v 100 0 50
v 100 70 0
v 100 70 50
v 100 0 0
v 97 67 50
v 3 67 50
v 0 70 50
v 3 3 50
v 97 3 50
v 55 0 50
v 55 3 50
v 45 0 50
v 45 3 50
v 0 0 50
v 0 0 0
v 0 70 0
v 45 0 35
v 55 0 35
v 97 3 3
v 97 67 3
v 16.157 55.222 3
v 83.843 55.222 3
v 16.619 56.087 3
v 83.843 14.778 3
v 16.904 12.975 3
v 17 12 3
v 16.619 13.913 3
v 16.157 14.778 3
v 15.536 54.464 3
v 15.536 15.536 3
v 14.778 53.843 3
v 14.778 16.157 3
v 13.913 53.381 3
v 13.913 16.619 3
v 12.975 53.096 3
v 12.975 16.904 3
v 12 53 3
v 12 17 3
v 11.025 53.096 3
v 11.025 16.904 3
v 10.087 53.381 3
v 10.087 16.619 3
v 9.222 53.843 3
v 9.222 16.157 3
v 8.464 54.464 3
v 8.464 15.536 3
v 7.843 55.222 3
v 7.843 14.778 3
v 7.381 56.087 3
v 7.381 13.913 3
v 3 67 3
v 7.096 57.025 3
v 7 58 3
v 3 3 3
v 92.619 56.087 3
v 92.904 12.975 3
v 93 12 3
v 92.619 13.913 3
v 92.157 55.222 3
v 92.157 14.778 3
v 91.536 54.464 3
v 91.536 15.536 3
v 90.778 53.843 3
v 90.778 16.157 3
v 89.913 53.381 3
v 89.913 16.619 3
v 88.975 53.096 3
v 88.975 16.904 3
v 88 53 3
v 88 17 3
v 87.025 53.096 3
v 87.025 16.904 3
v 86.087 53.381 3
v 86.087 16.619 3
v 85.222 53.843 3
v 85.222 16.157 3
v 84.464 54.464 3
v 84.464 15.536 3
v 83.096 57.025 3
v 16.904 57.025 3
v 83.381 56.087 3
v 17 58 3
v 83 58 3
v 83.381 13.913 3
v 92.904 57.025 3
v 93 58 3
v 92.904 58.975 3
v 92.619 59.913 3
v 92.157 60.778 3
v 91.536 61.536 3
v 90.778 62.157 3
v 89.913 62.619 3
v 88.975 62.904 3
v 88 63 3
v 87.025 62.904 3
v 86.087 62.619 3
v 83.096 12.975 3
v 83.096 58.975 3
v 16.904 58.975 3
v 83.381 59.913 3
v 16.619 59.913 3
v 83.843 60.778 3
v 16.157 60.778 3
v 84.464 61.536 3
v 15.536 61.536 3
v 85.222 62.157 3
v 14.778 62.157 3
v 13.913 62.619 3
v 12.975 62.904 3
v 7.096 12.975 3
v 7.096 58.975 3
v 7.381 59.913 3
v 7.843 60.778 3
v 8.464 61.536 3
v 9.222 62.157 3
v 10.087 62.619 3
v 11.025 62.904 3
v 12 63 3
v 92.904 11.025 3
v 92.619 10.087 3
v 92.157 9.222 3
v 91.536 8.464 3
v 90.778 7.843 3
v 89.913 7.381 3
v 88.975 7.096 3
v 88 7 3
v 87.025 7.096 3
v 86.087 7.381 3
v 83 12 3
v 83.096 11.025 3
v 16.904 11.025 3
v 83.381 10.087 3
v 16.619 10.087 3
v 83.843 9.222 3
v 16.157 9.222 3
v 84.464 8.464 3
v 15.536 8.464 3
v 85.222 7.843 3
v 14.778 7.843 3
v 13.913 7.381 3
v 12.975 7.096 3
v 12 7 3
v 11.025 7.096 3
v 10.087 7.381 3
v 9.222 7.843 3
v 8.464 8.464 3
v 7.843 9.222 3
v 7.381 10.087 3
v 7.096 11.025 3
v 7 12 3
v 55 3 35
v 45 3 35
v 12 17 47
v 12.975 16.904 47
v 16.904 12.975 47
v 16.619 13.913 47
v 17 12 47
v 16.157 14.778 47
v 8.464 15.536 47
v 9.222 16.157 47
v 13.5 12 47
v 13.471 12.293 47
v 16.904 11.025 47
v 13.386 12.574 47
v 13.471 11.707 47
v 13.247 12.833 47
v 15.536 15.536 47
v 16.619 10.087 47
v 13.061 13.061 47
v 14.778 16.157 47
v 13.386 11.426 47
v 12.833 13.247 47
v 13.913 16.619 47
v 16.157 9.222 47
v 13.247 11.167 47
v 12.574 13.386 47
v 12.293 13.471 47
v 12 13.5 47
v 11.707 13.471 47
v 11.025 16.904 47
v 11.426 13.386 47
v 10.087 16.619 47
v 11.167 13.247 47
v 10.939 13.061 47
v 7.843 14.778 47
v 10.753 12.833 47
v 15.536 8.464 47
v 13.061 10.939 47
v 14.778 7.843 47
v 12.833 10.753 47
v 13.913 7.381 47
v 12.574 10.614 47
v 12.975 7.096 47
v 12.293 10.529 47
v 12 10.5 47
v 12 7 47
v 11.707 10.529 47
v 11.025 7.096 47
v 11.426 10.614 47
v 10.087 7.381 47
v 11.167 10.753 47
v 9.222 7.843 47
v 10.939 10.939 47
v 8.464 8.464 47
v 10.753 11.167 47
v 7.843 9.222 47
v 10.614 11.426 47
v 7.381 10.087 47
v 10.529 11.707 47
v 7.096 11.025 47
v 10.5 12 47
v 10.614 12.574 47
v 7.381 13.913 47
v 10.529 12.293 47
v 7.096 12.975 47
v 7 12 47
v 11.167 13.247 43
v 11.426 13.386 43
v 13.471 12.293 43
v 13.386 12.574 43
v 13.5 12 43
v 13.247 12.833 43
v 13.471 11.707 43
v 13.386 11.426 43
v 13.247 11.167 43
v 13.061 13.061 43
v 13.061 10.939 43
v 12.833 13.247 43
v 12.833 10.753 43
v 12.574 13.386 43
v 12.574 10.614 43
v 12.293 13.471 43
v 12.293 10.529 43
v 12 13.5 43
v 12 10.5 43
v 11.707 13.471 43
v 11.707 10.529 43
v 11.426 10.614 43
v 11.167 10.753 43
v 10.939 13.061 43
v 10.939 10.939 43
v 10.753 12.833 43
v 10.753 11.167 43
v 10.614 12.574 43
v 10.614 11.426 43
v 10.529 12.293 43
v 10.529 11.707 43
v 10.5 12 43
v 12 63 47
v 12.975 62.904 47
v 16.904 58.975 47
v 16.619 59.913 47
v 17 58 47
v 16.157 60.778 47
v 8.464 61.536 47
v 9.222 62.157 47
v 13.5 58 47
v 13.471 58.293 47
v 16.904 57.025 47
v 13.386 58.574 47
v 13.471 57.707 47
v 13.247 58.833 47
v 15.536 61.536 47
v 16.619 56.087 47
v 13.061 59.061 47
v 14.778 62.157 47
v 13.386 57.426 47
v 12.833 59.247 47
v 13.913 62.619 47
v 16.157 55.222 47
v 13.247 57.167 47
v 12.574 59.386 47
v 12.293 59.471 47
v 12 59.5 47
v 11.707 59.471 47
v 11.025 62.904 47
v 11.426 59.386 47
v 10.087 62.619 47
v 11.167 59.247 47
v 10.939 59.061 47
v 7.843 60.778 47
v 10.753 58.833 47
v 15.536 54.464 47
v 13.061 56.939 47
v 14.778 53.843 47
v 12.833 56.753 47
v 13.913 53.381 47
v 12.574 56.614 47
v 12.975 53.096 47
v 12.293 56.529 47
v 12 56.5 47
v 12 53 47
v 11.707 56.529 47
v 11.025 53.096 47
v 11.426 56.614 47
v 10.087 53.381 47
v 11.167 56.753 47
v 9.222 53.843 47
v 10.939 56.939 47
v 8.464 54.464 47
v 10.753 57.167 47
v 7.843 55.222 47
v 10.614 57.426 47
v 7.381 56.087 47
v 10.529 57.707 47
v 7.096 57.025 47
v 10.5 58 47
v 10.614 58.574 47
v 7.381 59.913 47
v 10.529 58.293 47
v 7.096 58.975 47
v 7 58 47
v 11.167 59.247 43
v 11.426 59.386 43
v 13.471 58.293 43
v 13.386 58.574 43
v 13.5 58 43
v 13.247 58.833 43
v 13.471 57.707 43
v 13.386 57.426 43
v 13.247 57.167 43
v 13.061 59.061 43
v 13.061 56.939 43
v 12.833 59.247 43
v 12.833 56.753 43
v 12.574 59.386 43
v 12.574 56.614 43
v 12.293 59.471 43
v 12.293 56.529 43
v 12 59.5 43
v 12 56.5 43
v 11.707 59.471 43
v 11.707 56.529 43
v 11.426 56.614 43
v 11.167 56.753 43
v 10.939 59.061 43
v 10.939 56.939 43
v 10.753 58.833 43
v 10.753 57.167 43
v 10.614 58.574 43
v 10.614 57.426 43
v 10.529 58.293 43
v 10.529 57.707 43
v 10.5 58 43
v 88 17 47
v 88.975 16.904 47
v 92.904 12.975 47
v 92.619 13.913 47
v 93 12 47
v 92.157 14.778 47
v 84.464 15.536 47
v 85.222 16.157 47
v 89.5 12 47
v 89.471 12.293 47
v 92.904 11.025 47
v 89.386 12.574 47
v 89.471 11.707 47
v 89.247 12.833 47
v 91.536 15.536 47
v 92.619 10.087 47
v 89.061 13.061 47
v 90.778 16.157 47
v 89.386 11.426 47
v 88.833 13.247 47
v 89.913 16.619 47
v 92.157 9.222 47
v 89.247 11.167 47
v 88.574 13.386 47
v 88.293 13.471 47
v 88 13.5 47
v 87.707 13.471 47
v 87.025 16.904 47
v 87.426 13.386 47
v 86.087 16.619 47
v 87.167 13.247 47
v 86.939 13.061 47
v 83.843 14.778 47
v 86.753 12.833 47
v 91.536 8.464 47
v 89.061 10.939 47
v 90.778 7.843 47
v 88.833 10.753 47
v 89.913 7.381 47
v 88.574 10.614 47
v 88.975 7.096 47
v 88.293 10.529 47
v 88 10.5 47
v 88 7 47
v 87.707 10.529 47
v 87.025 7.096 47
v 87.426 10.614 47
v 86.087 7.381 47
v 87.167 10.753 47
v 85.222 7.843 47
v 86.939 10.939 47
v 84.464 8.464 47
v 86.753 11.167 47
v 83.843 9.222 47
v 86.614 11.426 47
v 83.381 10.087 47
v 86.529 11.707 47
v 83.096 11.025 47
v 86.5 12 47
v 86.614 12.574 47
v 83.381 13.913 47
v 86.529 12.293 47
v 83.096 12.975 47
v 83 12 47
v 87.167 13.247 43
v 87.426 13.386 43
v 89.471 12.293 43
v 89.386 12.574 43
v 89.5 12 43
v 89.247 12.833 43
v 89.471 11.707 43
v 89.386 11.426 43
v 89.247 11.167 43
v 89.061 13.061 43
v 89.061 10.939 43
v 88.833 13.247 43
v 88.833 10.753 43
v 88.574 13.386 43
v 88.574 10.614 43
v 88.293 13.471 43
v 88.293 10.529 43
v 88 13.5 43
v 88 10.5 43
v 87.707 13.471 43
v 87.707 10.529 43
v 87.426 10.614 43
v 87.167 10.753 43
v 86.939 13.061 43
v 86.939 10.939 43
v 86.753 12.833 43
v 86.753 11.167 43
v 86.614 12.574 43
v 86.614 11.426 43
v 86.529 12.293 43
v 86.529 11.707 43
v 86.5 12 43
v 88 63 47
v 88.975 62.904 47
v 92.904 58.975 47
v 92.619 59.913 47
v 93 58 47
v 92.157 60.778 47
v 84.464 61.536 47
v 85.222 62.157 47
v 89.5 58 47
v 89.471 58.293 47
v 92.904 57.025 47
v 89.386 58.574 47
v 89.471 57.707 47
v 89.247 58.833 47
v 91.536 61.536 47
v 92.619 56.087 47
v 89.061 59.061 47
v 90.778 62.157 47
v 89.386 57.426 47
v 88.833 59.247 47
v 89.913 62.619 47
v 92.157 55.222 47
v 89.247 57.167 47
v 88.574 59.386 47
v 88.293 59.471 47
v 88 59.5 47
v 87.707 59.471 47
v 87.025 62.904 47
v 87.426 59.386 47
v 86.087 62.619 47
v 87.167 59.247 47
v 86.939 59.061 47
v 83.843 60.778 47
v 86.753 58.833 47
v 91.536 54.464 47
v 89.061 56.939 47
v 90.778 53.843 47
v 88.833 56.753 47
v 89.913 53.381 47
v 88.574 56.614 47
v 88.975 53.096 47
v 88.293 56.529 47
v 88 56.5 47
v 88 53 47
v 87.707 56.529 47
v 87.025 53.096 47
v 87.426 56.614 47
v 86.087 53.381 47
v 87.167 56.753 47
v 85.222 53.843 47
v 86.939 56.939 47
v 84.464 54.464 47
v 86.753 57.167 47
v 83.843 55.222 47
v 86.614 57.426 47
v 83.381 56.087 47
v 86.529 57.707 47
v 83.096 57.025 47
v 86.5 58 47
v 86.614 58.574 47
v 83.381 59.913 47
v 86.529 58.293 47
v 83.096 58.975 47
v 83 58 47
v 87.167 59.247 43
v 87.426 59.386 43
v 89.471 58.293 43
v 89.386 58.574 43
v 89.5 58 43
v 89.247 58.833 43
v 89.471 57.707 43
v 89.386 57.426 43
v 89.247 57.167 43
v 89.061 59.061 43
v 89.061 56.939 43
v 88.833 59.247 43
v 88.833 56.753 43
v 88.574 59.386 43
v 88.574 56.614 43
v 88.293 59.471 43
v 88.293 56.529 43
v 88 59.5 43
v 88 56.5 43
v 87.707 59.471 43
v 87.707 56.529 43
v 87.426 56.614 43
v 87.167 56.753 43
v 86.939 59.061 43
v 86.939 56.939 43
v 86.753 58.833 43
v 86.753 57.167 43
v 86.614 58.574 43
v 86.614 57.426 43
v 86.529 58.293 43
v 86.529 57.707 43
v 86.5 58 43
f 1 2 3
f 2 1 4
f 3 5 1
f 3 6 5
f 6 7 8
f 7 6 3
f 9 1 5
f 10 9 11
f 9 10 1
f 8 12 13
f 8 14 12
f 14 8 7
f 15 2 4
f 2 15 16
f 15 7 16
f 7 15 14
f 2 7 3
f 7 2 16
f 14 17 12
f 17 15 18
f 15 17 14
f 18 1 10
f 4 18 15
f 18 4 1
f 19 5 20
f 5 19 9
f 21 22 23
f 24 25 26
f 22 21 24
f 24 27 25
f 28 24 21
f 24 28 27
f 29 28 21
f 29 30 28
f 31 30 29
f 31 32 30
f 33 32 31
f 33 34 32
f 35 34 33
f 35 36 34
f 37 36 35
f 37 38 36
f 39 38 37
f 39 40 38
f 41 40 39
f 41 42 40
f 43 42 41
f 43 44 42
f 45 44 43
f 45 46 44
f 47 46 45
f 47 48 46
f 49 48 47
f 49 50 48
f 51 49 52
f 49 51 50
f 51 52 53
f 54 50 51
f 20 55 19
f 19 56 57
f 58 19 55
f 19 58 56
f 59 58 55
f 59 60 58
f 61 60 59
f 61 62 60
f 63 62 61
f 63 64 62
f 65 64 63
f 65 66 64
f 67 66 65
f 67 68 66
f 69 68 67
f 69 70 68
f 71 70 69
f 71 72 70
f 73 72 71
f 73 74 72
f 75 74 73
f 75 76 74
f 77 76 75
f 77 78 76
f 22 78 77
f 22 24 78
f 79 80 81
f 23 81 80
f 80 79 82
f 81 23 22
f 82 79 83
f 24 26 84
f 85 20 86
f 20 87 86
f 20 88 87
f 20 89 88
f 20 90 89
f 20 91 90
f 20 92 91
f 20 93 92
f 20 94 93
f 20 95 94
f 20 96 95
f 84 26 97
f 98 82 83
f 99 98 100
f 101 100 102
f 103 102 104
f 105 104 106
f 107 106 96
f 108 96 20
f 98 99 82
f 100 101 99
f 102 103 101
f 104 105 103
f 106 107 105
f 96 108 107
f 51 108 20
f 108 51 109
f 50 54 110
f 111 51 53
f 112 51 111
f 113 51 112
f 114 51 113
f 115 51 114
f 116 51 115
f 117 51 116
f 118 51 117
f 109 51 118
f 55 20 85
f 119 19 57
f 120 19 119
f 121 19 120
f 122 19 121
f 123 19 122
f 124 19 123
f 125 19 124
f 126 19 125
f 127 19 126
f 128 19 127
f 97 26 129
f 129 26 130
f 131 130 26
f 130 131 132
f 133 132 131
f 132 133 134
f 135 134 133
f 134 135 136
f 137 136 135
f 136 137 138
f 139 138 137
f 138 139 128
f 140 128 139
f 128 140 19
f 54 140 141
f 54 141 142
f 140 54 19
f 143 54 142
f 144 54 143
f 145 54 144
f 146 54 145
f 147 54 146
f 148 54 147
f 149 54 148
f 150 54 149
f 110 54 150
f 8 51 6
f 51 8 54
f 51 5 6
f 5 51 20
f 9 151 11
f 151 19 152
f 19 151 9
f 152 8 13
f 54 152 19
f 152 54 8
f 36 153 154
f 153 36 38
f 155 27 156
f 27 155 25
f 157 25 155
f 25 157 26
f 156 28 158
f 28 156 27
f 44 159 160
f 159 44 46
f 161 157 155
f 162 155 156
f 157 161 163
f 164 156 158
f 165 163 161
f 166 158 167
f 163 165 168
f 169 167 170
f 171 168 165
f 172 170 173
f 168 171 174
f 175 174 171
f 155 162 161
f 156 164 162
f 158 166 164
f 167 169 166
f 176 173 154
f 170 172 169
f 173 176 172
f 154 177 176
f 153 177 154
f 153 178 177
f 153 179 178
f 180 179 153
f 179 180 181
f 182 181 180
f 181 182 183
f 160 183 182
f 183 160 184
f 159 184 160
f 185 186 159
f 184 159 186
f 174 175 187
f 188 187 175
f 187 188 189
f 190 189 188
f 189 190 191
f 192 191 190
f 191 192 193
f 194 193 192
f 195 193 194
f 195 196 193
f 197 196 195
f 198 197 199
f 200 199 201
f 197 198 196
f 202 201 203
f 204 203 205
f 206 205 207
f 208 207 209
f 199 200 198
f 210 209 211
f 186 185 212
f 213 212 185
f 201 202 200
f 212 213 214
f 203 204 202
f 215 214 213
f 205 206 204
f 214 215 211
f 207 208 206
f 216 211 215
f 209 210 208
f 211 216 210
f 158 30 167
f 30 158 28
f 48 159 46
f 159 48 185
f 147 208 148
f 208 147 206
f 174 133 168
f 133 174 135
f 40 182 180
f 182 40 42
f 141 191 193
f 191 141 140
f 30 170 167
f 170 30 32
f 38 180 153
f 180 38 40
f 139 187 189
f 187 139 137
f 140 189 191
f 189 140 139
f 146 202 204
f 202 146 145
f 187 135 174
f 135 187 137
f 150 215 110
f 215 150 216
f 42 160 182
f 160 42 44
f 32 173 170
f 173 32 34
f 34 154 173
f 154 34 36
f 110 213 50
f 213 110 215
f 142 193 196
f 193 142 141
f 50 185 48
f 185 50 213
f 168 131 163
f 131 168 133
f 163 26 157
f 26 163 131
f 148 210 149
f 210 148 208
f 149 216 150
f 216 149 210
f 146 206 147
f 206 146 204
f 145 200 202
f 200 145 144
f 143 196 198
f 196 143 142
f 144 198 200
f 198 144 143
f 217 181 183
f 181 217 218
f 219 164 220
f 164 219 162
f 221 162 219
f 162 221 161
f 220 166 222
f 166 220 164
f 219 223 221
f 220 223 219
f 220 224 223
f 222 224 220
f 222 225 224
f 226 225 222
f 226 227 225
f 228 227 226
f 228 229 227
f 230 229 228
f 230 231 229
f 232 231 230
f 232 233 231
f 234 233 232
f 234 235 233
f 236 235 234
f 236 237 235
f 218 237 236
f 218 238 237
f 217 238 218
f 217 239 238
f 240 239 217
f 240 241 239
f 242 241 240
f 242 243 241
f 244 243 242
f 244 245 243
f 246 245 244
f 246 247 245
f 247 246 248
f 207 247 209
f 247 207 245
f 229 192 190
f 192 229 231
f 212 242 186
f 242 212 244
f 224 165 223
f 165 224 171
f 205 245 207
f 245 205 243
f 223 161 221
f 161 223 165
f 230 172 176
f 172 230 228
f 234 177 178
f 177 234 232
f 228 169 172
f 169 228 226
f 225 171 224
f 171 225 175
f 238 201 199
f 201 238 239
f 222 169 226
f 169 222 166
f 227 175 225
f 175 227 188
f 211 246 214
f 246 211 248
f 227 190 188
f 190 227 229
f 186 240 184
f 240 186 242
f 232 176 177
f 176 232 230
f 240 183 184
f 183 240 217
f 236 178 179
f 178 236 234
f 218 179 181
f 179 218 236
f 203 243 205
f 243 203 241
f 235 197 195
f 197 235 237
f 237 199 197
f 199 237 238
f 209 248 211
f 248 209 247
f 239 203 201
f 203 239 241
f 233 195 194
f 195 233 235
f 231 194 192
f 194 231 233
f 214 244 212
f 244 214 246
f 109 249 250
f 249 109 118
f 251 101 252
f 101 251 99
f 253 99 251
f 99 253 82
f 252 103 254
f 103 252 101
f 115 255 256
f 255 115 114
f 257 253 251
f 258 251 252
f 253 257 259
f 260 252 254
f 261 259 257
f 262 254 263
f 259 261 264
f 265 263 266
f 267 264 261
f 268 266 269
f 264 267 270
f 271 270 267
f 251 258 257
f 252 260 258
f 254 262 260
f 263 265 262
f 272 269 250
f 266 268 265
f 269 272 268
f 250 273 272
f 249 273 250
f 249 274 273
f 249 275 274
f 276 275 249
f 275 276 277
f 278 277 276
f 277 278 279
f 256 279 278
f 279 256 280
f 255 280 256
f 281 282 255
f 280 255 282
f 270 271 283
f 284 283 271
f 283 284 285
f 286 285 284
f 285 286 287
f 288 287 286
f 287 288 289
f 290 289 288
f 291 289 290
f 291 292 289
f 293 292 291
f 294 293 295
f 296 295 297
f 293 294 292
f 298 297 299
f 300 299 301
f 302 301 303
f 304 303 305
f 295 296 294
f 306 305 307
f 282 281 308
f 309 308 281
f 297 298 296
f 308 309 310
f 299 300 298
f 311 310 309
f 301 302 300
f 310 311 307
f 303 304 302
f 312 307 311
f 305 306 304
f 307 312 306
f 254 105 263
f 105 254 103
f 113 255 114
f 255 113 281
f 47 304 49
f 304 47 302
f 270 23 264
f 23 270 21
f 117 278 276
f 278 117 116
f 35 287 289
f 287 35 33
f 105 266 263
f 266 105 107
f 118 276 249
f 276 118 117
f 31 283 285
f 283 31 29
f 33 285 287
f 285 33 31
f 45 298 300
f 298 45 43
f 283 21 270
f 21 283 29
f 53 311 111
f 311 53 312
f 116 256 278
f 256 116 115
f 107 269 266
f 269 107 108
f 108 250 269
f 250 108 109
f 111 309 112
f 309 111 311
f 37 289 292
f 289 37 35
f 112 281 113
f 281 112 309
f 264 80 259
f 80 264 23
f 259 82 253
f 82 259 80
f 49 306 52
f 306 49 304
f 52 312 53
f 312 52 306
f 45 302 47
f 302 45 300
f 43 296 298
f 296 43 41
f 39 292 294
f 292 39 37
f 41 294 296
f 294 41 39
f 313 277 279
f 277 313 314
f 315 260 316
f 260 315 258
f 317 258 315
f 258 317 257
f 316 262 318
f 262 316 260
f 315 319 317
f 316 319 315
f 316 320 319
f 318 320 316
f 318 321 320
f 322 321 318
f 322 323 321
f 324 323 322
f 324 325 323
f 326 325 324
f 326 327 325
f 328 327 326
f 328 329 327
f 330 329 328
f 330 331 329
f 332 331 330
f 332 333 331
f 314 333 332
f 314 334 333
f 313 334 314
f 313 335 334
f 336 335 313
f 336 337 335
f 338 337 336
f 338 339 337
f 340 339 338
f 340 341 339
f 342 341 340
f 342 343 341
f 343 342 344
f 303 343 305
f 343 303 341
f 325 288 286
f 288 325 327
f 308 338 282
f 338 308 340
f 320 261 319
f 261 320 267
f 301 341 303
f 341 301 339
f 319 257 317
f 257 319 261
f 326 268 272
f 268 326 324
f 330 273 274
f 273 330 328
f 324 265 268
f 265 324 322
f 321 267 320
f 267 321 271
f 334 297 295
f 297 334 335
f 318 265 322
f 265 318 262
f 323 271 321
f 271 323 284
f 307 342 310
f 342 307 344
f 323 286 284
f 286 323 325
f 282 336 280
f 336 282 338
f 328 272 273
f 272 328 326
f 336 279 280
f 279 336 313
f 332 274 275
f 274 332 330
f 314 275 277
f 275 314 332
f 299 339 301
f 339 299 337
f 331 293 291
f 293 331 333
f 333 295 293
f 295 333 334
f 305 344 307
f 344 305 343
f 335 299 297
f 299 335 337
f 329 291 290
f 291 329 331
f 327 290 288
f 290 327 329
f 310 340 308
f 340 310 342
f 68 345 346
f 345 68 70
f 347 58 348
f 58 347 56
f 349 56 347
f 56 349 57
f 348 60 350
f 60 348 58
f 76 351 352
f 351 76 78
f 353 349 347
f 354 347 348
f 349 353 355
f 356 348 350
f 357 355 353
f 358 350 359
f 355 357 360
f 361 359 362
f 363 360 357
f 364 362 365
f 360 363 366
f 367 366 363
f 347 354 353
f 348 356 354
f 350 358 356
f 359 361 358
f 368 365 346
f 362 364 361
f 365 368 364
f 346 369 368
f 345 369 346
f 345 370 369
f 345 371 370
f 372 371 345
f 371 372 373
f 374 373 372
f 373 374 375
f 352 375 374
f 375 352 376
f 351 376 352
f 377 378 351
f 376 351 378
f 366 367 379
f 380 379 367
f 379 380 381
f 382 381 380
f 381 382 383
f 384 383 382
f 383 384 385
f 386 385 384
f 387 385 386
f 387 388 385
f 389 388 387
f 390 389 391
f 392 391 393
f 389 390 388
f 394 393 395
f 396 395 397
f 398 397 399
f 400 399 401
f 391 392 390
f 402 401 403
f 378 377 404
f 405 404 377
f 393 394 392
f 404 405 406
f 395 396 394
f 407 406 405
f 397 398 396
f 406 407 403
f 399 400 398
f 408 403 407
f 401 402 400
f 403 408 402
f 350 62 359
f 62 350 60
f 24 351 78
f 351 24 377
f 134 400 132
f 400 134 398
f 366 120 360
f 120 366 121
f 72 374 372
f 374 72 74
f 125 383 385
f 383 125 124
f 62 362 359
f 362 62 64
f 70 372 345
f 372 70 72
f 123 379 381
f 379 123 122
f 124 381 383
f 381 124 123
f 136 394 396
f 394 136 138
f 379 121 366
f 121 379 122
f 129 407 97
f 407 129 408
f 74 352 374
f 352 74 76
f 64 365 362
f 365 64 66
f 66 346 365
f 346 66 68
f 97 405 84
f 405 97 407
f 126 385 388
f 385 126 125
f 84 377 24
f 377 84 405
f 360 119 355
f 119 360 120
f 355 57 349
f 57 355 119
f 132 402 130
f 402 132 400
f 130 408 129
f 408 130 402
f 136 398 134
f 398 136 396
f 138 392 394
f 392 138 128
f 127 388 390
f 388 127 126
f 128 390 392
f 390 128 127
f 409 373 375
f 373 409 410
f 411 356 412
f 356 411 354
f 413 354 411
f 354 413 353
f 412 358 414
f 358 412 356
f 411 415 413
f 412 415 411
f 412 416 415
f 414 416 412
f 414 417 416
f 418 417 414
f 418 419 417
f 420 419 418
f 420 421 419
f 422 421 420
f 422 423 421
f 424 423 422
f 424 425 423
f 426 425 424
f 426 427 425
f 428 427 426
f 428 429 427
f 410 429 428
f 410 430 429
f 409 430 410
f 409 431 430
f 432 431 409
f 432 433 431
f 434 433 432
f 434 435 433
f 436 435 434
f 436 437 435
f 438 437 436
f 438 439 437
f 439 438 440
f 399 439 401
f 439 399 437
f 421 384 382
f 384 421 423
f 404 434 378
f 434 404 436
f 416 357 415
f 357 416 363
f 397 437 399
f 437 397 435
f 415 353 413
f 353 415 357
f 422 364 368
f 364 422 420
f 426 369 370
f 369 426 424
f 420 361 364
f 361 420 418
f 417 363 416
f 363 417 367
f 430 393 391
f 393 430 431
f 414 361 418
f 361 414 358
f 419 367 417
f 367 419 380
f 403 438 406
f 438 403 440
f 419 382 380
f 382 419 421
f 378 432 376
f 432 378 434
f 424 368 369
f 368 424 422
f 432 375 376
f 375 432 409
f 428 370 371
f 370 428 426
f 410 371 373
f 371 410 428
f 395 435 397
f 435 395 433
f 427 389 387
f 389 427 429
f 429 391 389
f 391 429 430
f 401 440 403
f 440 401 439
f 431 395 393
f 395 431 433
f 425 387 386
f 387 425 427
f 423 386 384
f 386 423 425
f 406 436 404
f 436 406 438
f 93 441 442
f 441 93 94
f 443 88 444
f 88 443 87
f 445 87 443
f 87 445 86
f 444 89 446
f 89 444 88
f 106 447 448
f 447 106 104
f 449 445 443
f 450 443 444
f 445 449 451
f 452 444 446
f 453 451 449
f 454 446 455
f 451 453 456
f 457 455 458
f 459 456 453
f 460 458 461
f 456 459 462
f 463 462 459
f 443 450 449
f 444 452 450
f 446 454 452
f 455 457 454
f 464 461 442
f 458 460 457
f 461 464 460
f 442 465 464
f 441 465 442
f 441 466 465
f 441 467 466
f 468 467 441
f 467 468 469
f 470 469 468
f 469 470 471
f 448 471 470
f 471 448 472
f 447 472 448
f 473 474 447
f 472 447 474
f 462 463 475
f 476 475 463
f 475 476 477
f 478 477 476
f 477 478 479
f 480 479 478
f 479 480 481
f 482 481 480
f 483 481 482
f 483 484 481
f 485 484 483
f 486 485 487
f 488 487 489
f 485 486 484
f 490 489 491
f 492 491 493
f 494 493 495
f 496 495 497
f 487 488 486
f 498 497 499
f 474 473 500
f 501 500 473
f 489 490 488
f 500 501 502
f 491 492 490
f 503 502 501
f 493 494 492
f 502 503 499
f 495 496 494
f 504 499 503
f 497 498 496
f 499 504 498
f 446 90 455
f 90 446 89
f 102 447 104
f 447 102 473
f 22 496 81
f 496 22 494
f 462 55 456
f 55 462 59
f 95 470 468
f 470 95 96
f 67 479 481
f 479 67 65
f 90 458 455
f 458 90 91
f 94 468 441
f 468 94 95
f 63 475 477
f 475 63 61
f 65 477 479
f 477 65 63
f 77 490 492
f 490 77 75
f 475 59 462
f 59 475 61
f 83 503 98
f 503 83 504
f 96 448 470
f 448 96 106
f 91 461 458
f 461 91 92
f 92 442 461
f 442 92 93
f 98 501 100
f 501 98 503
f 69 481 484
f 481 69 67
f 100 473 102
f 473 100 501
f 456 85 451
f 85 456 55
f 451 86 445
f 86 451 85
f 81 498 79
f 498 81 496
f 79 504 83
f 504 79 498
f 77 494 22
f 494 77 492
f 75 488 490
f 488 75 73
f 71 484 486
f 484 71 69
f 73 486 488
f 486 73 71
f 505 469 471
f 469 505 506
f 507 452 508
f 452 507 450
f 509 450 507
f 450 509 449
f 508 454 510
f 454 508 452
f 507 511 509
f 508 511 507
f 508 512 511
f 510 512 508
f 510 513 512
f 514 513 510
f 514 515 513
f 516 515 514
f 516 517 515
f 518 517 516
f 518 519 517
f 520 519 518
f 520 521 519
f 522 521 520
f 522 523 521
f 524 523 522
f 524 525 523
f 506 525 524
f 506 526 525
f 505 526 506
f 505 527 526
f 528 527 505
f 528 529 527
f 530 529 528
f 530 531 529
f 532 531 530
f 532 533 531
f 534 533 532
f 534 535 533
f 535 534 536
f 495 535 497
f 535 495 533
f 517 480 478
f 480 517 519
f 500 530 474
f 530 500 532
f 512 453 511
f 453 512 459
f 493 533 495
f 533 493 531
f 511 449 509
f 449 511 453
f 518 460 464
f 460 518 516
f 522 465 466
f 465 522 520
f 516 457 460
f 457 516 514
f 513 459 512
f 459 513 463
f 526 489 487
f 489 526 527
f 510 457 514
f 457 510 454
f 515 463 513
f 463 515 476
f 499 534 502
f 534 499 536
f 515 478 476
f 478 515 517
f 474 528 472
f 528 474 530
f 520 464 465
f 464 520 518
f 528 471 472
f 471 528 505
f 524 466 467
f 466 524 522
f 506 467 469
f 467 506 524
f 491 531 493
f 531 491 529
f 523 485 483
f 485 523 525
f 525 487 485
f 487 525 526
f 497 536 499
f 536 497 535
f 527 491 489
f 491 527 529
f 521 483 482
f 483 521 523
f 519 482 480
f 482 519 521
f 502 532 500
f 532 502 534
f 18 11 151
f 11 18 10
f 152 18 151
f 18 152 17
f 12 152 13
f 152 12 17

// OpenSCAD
$fn = 32;

// ----------------------------------------------------------------------
// Enclosure box: both enclosure
// ----------------------------------------------------------------------

// --- parameters (mm) ---
box_l = 100;              // outer length, X
box_w = 70;               // outer width, Y
box_h = 50;               // outer height
wall_t = 3;               // wall thickness
boss_r = 5;               // corner boss radius
hole_r = 1.5;             // boss screw hole radius
boss_in = 12;             // boss inset from the corners
notch_w = 10;             // cable notch width
notch_h = 15;             // cable notch height

inner_h = box_h - wall_t;  // cavity depth
boss_h = inner_h - 2;  // corner boss height

difference() {
  union() {
    difference() {
      cube([box_l, box_w, box_h]);
      translate([wall_t, wall_t, wall_t])
        cube([box_l - 2 * wall_t, box_w - 2 * wall_t, box_h]);
    }
    for (sx = [0, 1], sy = [0, 1])
      translate([sx ? box_l - boss_in : boss_in,
                 sy ? box_w - boss_in : boss_in, wall_t - 1])
        difference() {
          cylinder(r = boss_r, h = boss_h);
          translate([0, 0, boss_h - 4])
            cylinder(r = hole_r, h = 5);
        }
  }
  translate([box_l / 2 - notch_w / 2, -1, box_h - notch_h])
    cube([notch_w, wall_t + 2, notch_h + 1]);
}
